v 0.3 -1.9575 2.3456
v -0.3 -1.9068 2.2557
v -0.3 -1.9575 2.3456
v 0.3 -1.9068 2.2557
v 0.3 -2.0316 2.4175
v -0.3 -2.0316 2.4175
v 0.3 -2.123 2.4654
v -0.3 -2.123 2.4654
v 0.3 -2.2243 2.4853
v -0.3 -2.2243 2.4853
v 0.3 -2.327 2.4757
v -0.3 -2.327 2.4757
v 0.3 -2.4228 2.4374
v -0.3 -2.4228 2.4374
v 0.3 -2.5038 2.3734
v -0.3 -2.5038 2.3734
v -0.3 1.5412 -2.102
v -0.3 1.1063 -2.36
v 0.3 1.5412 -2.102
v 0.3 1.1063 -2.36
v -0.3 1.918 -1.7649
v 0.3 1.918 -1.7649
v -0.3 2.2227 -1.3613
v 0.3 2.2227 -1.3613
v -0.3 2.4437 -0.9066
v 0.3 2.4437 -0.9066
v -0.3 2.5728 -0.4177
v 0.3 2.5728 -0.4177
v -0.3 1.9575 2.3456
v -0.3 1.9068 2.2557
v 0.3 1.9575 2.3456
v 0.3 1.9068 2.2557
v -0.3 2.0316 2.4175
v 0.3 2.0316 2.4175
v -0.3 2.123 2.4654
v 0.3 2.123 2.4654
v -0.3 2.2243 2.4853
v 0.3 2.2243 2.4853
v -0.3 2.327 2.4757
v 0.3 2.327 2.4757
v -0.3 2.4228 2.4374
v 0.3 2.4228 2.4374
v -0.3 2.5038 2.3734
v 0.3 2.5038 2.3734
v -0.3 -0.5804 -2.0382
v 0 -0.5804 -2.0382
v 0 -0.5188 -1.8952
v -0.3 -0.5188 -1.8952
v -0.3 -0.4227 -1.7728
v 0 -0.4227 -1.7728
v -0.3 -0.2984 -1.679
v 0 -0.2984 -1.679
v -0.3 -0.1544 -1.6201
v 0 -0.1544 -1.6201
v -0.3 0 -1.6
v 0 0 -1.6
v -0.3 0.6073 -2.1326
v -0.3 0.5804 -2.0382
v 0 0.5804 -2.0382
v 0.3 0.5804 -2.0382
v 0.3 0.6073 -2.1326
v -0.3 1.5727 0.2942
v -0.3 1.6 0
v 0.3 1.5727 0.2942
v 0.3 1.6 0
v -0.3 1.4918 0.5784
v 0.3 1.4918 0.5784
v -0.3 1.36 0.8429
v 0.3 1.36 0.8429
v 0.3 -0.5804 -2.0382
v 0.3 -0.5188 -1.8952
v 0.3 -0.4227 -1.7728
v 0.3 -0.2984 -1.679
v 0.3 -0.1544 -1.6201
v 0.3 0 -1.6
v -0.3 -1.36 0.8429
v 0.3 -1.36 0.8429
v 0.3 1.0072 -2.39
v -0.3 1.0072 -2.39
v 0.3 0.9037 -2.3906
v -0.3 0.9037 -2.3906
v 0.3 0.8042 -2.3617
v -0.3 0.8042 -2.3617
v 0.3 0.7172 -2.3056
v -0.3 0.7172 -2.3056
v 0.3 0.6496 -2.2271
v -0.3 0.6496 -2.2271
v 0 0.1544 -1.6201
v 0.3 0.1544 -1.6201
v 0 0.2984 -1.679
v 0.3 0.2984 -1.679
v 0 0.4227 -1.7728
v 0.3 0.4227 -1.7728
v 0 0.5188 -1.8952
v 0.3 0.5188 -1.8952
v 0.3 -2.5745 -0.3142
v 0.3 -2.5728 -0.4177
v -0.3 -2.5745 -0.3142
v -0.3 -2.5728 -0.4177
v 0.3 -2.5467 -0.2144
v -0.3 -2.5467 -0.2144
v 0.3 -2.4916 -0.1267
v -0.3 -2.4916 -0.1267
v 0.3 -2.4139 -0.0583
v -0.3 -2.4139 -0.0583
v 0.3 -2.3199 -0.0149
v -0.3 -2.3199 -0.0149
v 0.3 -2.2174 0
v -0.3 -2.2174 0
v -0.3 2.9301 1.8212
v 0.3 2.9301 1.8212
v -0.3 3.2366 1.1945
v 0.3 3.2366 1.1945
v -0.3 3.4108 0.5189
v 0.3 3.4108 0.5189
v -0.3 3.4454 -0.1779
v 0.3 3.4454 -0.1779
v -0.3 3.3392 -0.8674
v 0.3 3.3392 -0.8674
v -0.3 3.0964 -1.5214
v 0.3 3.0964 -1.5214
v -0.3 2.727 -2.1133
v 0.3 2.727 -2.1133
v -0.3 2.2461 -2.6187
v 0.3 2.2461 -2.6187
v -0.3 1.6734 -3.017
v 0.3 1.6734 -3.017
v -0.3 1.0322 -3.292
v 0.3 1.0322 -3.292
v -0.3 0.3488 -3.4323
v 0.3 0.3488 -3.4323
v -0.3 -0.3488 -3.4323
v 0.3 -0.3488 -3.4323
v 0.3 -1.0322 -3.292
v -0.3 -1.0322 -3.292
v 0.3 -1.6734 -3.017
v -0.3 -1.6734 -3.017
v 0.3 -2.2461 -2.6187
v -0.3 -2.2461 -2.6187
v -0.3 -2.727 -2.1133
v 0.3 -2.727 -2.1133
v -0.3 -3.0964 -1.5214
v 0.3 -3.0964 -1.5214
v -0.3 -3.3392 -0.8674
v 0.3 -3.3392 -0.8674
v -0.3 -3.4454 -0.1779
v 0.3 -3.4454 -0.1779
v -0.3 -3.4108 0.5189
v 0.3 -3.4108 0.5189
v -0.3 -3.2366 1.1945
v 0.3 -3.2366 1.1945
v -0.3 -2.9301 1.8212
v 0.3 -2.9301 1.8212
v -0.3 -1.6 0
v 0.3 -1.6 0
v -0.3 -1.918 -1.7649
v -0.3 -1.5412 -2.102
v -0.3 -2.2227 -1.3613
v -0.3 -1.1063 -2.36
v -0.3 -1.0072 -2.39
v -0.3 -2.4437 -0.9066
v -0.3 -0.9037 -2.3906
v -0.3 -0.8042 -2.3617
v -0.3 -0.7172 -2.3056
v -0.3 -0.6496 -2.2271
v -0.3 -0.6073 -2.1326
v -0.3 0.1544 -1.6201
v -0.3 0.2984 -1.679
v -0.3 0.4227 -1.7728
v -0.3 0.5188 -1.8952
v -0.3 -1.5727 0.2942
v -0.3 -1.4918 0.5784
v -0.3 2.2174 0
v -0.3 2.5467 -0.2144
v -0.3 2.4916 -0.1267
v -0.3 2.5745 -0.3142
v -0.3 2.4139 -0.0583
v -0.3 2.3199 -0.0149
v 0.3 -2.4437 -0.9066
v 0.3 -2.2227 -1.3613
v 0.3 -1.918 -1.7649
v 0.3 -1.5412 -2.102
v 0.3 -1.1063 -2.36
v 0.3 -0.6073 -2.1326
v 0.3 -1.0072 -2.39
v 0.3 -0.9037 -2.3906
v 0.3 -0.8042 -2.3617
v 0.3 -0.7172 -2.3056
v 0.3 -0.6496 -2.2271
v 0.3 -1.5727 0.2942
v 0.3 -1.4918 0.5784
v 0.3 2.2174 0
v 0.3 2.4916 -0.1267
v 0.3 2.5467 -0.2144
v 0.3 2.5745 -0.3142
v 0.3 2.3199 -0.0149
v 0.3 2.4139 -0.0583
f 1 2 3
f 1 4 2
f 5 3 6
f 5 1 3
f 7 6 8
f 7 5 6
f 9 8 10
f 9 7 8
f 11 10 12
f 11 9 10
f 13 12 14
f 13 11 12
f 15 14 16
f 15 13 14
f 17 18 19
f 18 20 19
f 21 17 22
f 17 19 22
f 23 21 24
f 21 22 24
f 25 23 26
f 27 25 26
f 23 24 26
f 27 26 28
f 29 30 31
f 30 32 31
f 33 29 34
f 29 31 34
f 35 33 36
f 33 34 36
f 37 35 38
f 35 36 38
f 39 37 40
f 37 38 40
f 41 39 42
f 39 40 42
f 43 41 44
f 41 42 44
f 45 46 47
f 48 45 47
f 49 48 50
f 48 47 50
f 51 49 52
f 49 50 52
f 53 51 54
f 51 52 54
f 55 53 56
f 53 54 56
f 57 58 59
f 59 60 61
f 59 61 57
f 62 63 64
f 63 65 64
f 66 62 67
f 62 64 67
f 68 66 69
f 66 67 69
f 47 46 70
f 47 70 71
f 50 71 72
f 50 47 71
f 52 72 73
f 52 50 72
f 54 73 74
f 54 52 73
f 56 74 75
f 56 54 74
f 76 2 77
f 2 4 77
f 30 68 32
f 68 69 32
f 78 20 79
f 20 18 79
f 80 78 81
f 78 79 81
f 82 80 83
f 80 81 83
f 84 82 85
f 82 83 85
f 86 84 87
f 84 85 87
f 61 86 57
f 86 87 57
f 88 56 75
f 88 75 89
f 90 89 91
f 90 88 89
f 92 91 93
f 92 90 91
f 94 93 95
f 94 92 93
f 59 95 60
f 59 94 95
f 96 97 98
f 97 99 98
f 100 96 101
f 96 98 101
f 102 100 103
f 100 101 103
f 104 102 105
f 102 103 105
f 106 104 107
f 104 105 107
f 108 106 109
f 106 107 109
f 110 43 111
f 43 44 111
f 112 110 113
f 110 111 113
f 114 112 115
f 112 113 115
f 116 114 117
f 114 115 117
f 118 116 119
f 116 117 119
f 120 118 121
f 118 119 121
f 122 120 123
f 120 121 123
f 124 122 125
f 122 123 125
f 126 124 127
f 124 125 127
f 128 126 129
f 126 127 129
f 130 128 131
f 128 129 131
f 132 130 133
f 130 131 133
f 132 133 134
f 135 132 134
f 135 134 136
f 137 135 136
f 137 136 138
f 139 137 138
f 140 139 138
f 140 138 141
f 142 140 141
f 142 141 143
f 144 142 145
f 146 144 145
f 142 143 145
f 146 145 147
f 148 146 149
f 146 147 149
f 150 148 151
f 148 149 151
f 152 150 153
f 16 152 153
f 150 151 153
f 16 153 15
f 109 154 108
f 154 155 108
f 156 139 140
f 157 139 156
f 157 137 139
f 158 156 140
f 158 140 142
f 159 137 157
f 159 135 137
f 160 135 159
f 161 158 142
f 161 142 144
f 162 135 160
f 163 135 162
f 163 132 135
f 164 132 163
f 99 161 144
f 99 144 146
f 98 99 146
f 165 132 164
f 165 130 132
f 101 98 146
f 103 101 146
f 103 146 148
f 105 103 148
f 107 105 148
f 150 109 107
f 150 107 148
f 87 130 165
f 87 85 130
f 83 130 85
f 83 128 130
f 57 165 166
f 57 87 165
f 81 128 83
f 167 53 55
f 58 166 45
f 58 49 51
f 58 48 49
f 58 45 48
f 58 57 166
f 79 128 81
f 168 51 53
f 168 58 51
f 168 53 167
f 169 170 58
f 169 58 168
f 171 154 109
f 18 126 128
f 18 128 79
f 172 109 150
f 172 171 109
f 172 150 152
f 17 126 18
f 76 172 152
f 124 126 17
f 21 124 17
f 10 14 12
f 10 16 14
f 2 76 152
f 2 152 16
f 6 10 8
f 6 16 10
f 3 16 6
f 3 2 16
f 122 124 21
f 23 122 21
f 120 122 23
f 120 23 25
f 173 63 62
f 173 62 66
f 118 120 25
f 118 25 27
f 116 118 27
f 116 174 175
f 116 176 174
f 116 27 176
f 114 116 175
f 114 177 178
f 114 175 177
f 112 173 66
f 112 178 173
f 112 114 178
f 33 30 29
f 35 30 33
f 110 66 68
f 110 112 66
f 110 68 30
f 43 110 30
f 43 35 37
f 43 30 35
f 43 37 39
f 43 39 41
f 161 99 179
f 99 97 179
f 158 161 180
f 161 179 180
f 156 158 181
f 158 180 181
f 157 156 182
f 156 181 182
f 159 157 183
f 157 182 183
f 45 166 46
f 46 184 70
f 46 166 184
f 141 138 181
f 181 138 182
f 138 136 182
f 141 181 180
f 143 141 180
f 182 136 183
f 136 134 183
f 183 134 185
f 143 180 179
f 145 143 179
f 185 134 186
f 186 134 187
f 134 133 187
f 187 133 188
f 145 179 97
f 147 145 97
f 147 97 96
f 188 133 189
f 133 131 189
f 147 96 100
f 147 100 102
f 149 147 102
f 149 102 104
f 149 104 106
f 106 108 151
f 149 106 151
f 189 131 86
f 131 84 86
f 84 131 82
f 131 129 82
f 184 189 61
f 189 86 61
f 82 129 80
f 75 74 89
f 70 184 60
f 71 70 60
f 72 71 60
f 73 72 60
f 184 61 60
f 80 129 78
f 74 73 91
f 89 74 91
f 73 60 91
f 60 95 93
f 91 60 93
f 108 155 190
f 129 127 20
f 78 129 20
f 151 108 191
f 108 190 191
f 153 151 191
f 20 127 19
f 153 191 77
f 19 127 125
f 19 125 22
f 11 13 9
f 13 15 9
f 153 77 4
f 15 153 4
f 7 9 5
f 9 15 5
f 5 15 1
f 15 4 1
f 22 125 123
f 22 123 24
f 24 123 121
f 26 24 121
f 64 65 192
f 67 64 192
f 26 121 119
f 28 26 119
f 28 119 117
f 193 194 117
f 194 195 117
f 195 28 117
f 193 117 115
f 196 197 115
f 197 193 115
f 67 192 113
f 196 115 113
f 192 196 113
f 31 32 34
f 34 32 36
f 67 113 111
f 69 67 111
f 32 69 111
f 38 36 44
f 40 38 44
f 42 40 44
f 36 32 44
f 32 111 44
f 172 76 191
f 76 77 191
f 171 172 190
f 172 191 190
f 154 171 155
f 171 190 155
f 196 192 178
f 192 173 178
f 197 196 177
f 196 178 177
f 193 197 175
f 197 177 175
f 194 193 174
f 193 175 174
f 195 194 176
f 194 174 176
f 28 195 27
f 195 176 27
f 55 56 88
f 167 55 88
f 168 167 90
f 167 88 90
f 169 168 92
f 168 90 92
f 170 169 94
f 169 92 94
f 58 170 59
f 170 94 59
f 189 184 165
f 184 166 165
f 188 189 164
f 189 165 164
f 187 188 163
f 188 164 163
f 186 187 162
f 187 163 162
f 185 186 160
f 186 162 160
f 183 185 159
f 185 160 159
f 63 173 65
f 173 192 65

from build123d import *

# Parameters (mm, degrees)
EXTRUDE1_DEPTH          = 0.3
FILLET1_R               = 0.36
CUT_EXTRUDE1_DEPTH      = 1.3
CUT_EXTRUDE1_DEPTH_BACK = 1.3


with BuildPart() as part:
    # Sketch1 → Extrude1 (new body, symmetric)
    with BuildSketch(Plane(origin=(0, 0, 0), x_dir=(0, 0, -1), z_dir=(1, 0, 0))):
        with BuildLine():
            Line((-2.741249311, -2.094767819), (-0.8428523, -1.36))
            ThreePointArc((-0.8428523, -1.36), (-0.438178046, -1.538830725), (0, -1.6))
            Line((0, -1.6), (0, -2.606451613))
            ThreePointArc((0, -2.606451613), (1.570523601, -2.080155193), (2.506804891, -0.713806172))
            Line((2.506804891, -0.713806172), (1.538830725, -0.438178046))
            ThreePointArc((1.538830725, -0.438178046), (1.6, 0), (1.538830725, 0.438178046))
            Line((1.538830725, 0.438178046), (2.506804891, 0.713806172))
            ThreePointArc((2.506804891, 0.713806172), (1.570523601, 2.080155193), (0, 2.606451613))
            Line((0, 2.606451613), (0, 1.6))
            ThreePointArc((0, 1.6), (-0.438178046, 1.538830725), (-0.8428523, 1.36))
            Line((-0.8428523, 1.36), (-2.741249311, 2.094767819))
            ThreePointArc((-2.741249311, 2.094767819), (3.45, 0), (-2.741249311, -2.094767819))
        make_face()
    extrude(amount=EXTRUDE1_DEPTH, both=True)

    # Fillet1
    fillet1_edges = [part.edges().sort_by_distance(p)[0] for p in [
        (0, -2.094767819, 2.741249311),
        (0, -2.606451613, 0),
        (0, -0.713806172, -2.506804891),
        (0, 0.713806172, -2.506804891),
        (0, 2.606451613, 0),
        (0, 2.094767819, 2.741249311),
    ]]
    fillet(fillet1_edges, radius=FILLET1_R)

    # Sketch4 → Cut-Extrude1 (cut, two sides)
    with BuildSketch(Plane(origin=(0, 0, 0), x_dir=(0, 0, -1), z_dir=(1, 0, 0))) as cut_extrude1_sk:
        with BuildLine():
            ThreePointArc((1.538830725, 0.438178046), (1.584633895, 0.221213517), (1.6, 0))
            ThreePointArc((1.6, 0), (1.721846138, 0.363601628), (2.038178046, 0.580365897))
            Line((2.038178046, 0.580365897), (1.538830725, 0.438178046))
        make_face()
        with BuildLine():
            ThreePointArc((1.6, 0), (1.584633895, -0.221213517), (1.538830725, -0.438178046))
            Line((1.538830725, -0.438178046), (2.038178046, -0.580365897))
            ThreePointArc((2.038178046, -0.580365897), (1.721846138, -0.363601628), (1.6, 0))
        make_face()
    extrude(amount=CUT_EXTRUDE1_DEPTH, mode=Mode.SUBTRACT)
    extrude(cut_extrude1_sk.sketch, amount=-CUT_EXTRUDE1_DEPTH_BACK, mode=Mode.SUBTRACT)


solid = part.part
